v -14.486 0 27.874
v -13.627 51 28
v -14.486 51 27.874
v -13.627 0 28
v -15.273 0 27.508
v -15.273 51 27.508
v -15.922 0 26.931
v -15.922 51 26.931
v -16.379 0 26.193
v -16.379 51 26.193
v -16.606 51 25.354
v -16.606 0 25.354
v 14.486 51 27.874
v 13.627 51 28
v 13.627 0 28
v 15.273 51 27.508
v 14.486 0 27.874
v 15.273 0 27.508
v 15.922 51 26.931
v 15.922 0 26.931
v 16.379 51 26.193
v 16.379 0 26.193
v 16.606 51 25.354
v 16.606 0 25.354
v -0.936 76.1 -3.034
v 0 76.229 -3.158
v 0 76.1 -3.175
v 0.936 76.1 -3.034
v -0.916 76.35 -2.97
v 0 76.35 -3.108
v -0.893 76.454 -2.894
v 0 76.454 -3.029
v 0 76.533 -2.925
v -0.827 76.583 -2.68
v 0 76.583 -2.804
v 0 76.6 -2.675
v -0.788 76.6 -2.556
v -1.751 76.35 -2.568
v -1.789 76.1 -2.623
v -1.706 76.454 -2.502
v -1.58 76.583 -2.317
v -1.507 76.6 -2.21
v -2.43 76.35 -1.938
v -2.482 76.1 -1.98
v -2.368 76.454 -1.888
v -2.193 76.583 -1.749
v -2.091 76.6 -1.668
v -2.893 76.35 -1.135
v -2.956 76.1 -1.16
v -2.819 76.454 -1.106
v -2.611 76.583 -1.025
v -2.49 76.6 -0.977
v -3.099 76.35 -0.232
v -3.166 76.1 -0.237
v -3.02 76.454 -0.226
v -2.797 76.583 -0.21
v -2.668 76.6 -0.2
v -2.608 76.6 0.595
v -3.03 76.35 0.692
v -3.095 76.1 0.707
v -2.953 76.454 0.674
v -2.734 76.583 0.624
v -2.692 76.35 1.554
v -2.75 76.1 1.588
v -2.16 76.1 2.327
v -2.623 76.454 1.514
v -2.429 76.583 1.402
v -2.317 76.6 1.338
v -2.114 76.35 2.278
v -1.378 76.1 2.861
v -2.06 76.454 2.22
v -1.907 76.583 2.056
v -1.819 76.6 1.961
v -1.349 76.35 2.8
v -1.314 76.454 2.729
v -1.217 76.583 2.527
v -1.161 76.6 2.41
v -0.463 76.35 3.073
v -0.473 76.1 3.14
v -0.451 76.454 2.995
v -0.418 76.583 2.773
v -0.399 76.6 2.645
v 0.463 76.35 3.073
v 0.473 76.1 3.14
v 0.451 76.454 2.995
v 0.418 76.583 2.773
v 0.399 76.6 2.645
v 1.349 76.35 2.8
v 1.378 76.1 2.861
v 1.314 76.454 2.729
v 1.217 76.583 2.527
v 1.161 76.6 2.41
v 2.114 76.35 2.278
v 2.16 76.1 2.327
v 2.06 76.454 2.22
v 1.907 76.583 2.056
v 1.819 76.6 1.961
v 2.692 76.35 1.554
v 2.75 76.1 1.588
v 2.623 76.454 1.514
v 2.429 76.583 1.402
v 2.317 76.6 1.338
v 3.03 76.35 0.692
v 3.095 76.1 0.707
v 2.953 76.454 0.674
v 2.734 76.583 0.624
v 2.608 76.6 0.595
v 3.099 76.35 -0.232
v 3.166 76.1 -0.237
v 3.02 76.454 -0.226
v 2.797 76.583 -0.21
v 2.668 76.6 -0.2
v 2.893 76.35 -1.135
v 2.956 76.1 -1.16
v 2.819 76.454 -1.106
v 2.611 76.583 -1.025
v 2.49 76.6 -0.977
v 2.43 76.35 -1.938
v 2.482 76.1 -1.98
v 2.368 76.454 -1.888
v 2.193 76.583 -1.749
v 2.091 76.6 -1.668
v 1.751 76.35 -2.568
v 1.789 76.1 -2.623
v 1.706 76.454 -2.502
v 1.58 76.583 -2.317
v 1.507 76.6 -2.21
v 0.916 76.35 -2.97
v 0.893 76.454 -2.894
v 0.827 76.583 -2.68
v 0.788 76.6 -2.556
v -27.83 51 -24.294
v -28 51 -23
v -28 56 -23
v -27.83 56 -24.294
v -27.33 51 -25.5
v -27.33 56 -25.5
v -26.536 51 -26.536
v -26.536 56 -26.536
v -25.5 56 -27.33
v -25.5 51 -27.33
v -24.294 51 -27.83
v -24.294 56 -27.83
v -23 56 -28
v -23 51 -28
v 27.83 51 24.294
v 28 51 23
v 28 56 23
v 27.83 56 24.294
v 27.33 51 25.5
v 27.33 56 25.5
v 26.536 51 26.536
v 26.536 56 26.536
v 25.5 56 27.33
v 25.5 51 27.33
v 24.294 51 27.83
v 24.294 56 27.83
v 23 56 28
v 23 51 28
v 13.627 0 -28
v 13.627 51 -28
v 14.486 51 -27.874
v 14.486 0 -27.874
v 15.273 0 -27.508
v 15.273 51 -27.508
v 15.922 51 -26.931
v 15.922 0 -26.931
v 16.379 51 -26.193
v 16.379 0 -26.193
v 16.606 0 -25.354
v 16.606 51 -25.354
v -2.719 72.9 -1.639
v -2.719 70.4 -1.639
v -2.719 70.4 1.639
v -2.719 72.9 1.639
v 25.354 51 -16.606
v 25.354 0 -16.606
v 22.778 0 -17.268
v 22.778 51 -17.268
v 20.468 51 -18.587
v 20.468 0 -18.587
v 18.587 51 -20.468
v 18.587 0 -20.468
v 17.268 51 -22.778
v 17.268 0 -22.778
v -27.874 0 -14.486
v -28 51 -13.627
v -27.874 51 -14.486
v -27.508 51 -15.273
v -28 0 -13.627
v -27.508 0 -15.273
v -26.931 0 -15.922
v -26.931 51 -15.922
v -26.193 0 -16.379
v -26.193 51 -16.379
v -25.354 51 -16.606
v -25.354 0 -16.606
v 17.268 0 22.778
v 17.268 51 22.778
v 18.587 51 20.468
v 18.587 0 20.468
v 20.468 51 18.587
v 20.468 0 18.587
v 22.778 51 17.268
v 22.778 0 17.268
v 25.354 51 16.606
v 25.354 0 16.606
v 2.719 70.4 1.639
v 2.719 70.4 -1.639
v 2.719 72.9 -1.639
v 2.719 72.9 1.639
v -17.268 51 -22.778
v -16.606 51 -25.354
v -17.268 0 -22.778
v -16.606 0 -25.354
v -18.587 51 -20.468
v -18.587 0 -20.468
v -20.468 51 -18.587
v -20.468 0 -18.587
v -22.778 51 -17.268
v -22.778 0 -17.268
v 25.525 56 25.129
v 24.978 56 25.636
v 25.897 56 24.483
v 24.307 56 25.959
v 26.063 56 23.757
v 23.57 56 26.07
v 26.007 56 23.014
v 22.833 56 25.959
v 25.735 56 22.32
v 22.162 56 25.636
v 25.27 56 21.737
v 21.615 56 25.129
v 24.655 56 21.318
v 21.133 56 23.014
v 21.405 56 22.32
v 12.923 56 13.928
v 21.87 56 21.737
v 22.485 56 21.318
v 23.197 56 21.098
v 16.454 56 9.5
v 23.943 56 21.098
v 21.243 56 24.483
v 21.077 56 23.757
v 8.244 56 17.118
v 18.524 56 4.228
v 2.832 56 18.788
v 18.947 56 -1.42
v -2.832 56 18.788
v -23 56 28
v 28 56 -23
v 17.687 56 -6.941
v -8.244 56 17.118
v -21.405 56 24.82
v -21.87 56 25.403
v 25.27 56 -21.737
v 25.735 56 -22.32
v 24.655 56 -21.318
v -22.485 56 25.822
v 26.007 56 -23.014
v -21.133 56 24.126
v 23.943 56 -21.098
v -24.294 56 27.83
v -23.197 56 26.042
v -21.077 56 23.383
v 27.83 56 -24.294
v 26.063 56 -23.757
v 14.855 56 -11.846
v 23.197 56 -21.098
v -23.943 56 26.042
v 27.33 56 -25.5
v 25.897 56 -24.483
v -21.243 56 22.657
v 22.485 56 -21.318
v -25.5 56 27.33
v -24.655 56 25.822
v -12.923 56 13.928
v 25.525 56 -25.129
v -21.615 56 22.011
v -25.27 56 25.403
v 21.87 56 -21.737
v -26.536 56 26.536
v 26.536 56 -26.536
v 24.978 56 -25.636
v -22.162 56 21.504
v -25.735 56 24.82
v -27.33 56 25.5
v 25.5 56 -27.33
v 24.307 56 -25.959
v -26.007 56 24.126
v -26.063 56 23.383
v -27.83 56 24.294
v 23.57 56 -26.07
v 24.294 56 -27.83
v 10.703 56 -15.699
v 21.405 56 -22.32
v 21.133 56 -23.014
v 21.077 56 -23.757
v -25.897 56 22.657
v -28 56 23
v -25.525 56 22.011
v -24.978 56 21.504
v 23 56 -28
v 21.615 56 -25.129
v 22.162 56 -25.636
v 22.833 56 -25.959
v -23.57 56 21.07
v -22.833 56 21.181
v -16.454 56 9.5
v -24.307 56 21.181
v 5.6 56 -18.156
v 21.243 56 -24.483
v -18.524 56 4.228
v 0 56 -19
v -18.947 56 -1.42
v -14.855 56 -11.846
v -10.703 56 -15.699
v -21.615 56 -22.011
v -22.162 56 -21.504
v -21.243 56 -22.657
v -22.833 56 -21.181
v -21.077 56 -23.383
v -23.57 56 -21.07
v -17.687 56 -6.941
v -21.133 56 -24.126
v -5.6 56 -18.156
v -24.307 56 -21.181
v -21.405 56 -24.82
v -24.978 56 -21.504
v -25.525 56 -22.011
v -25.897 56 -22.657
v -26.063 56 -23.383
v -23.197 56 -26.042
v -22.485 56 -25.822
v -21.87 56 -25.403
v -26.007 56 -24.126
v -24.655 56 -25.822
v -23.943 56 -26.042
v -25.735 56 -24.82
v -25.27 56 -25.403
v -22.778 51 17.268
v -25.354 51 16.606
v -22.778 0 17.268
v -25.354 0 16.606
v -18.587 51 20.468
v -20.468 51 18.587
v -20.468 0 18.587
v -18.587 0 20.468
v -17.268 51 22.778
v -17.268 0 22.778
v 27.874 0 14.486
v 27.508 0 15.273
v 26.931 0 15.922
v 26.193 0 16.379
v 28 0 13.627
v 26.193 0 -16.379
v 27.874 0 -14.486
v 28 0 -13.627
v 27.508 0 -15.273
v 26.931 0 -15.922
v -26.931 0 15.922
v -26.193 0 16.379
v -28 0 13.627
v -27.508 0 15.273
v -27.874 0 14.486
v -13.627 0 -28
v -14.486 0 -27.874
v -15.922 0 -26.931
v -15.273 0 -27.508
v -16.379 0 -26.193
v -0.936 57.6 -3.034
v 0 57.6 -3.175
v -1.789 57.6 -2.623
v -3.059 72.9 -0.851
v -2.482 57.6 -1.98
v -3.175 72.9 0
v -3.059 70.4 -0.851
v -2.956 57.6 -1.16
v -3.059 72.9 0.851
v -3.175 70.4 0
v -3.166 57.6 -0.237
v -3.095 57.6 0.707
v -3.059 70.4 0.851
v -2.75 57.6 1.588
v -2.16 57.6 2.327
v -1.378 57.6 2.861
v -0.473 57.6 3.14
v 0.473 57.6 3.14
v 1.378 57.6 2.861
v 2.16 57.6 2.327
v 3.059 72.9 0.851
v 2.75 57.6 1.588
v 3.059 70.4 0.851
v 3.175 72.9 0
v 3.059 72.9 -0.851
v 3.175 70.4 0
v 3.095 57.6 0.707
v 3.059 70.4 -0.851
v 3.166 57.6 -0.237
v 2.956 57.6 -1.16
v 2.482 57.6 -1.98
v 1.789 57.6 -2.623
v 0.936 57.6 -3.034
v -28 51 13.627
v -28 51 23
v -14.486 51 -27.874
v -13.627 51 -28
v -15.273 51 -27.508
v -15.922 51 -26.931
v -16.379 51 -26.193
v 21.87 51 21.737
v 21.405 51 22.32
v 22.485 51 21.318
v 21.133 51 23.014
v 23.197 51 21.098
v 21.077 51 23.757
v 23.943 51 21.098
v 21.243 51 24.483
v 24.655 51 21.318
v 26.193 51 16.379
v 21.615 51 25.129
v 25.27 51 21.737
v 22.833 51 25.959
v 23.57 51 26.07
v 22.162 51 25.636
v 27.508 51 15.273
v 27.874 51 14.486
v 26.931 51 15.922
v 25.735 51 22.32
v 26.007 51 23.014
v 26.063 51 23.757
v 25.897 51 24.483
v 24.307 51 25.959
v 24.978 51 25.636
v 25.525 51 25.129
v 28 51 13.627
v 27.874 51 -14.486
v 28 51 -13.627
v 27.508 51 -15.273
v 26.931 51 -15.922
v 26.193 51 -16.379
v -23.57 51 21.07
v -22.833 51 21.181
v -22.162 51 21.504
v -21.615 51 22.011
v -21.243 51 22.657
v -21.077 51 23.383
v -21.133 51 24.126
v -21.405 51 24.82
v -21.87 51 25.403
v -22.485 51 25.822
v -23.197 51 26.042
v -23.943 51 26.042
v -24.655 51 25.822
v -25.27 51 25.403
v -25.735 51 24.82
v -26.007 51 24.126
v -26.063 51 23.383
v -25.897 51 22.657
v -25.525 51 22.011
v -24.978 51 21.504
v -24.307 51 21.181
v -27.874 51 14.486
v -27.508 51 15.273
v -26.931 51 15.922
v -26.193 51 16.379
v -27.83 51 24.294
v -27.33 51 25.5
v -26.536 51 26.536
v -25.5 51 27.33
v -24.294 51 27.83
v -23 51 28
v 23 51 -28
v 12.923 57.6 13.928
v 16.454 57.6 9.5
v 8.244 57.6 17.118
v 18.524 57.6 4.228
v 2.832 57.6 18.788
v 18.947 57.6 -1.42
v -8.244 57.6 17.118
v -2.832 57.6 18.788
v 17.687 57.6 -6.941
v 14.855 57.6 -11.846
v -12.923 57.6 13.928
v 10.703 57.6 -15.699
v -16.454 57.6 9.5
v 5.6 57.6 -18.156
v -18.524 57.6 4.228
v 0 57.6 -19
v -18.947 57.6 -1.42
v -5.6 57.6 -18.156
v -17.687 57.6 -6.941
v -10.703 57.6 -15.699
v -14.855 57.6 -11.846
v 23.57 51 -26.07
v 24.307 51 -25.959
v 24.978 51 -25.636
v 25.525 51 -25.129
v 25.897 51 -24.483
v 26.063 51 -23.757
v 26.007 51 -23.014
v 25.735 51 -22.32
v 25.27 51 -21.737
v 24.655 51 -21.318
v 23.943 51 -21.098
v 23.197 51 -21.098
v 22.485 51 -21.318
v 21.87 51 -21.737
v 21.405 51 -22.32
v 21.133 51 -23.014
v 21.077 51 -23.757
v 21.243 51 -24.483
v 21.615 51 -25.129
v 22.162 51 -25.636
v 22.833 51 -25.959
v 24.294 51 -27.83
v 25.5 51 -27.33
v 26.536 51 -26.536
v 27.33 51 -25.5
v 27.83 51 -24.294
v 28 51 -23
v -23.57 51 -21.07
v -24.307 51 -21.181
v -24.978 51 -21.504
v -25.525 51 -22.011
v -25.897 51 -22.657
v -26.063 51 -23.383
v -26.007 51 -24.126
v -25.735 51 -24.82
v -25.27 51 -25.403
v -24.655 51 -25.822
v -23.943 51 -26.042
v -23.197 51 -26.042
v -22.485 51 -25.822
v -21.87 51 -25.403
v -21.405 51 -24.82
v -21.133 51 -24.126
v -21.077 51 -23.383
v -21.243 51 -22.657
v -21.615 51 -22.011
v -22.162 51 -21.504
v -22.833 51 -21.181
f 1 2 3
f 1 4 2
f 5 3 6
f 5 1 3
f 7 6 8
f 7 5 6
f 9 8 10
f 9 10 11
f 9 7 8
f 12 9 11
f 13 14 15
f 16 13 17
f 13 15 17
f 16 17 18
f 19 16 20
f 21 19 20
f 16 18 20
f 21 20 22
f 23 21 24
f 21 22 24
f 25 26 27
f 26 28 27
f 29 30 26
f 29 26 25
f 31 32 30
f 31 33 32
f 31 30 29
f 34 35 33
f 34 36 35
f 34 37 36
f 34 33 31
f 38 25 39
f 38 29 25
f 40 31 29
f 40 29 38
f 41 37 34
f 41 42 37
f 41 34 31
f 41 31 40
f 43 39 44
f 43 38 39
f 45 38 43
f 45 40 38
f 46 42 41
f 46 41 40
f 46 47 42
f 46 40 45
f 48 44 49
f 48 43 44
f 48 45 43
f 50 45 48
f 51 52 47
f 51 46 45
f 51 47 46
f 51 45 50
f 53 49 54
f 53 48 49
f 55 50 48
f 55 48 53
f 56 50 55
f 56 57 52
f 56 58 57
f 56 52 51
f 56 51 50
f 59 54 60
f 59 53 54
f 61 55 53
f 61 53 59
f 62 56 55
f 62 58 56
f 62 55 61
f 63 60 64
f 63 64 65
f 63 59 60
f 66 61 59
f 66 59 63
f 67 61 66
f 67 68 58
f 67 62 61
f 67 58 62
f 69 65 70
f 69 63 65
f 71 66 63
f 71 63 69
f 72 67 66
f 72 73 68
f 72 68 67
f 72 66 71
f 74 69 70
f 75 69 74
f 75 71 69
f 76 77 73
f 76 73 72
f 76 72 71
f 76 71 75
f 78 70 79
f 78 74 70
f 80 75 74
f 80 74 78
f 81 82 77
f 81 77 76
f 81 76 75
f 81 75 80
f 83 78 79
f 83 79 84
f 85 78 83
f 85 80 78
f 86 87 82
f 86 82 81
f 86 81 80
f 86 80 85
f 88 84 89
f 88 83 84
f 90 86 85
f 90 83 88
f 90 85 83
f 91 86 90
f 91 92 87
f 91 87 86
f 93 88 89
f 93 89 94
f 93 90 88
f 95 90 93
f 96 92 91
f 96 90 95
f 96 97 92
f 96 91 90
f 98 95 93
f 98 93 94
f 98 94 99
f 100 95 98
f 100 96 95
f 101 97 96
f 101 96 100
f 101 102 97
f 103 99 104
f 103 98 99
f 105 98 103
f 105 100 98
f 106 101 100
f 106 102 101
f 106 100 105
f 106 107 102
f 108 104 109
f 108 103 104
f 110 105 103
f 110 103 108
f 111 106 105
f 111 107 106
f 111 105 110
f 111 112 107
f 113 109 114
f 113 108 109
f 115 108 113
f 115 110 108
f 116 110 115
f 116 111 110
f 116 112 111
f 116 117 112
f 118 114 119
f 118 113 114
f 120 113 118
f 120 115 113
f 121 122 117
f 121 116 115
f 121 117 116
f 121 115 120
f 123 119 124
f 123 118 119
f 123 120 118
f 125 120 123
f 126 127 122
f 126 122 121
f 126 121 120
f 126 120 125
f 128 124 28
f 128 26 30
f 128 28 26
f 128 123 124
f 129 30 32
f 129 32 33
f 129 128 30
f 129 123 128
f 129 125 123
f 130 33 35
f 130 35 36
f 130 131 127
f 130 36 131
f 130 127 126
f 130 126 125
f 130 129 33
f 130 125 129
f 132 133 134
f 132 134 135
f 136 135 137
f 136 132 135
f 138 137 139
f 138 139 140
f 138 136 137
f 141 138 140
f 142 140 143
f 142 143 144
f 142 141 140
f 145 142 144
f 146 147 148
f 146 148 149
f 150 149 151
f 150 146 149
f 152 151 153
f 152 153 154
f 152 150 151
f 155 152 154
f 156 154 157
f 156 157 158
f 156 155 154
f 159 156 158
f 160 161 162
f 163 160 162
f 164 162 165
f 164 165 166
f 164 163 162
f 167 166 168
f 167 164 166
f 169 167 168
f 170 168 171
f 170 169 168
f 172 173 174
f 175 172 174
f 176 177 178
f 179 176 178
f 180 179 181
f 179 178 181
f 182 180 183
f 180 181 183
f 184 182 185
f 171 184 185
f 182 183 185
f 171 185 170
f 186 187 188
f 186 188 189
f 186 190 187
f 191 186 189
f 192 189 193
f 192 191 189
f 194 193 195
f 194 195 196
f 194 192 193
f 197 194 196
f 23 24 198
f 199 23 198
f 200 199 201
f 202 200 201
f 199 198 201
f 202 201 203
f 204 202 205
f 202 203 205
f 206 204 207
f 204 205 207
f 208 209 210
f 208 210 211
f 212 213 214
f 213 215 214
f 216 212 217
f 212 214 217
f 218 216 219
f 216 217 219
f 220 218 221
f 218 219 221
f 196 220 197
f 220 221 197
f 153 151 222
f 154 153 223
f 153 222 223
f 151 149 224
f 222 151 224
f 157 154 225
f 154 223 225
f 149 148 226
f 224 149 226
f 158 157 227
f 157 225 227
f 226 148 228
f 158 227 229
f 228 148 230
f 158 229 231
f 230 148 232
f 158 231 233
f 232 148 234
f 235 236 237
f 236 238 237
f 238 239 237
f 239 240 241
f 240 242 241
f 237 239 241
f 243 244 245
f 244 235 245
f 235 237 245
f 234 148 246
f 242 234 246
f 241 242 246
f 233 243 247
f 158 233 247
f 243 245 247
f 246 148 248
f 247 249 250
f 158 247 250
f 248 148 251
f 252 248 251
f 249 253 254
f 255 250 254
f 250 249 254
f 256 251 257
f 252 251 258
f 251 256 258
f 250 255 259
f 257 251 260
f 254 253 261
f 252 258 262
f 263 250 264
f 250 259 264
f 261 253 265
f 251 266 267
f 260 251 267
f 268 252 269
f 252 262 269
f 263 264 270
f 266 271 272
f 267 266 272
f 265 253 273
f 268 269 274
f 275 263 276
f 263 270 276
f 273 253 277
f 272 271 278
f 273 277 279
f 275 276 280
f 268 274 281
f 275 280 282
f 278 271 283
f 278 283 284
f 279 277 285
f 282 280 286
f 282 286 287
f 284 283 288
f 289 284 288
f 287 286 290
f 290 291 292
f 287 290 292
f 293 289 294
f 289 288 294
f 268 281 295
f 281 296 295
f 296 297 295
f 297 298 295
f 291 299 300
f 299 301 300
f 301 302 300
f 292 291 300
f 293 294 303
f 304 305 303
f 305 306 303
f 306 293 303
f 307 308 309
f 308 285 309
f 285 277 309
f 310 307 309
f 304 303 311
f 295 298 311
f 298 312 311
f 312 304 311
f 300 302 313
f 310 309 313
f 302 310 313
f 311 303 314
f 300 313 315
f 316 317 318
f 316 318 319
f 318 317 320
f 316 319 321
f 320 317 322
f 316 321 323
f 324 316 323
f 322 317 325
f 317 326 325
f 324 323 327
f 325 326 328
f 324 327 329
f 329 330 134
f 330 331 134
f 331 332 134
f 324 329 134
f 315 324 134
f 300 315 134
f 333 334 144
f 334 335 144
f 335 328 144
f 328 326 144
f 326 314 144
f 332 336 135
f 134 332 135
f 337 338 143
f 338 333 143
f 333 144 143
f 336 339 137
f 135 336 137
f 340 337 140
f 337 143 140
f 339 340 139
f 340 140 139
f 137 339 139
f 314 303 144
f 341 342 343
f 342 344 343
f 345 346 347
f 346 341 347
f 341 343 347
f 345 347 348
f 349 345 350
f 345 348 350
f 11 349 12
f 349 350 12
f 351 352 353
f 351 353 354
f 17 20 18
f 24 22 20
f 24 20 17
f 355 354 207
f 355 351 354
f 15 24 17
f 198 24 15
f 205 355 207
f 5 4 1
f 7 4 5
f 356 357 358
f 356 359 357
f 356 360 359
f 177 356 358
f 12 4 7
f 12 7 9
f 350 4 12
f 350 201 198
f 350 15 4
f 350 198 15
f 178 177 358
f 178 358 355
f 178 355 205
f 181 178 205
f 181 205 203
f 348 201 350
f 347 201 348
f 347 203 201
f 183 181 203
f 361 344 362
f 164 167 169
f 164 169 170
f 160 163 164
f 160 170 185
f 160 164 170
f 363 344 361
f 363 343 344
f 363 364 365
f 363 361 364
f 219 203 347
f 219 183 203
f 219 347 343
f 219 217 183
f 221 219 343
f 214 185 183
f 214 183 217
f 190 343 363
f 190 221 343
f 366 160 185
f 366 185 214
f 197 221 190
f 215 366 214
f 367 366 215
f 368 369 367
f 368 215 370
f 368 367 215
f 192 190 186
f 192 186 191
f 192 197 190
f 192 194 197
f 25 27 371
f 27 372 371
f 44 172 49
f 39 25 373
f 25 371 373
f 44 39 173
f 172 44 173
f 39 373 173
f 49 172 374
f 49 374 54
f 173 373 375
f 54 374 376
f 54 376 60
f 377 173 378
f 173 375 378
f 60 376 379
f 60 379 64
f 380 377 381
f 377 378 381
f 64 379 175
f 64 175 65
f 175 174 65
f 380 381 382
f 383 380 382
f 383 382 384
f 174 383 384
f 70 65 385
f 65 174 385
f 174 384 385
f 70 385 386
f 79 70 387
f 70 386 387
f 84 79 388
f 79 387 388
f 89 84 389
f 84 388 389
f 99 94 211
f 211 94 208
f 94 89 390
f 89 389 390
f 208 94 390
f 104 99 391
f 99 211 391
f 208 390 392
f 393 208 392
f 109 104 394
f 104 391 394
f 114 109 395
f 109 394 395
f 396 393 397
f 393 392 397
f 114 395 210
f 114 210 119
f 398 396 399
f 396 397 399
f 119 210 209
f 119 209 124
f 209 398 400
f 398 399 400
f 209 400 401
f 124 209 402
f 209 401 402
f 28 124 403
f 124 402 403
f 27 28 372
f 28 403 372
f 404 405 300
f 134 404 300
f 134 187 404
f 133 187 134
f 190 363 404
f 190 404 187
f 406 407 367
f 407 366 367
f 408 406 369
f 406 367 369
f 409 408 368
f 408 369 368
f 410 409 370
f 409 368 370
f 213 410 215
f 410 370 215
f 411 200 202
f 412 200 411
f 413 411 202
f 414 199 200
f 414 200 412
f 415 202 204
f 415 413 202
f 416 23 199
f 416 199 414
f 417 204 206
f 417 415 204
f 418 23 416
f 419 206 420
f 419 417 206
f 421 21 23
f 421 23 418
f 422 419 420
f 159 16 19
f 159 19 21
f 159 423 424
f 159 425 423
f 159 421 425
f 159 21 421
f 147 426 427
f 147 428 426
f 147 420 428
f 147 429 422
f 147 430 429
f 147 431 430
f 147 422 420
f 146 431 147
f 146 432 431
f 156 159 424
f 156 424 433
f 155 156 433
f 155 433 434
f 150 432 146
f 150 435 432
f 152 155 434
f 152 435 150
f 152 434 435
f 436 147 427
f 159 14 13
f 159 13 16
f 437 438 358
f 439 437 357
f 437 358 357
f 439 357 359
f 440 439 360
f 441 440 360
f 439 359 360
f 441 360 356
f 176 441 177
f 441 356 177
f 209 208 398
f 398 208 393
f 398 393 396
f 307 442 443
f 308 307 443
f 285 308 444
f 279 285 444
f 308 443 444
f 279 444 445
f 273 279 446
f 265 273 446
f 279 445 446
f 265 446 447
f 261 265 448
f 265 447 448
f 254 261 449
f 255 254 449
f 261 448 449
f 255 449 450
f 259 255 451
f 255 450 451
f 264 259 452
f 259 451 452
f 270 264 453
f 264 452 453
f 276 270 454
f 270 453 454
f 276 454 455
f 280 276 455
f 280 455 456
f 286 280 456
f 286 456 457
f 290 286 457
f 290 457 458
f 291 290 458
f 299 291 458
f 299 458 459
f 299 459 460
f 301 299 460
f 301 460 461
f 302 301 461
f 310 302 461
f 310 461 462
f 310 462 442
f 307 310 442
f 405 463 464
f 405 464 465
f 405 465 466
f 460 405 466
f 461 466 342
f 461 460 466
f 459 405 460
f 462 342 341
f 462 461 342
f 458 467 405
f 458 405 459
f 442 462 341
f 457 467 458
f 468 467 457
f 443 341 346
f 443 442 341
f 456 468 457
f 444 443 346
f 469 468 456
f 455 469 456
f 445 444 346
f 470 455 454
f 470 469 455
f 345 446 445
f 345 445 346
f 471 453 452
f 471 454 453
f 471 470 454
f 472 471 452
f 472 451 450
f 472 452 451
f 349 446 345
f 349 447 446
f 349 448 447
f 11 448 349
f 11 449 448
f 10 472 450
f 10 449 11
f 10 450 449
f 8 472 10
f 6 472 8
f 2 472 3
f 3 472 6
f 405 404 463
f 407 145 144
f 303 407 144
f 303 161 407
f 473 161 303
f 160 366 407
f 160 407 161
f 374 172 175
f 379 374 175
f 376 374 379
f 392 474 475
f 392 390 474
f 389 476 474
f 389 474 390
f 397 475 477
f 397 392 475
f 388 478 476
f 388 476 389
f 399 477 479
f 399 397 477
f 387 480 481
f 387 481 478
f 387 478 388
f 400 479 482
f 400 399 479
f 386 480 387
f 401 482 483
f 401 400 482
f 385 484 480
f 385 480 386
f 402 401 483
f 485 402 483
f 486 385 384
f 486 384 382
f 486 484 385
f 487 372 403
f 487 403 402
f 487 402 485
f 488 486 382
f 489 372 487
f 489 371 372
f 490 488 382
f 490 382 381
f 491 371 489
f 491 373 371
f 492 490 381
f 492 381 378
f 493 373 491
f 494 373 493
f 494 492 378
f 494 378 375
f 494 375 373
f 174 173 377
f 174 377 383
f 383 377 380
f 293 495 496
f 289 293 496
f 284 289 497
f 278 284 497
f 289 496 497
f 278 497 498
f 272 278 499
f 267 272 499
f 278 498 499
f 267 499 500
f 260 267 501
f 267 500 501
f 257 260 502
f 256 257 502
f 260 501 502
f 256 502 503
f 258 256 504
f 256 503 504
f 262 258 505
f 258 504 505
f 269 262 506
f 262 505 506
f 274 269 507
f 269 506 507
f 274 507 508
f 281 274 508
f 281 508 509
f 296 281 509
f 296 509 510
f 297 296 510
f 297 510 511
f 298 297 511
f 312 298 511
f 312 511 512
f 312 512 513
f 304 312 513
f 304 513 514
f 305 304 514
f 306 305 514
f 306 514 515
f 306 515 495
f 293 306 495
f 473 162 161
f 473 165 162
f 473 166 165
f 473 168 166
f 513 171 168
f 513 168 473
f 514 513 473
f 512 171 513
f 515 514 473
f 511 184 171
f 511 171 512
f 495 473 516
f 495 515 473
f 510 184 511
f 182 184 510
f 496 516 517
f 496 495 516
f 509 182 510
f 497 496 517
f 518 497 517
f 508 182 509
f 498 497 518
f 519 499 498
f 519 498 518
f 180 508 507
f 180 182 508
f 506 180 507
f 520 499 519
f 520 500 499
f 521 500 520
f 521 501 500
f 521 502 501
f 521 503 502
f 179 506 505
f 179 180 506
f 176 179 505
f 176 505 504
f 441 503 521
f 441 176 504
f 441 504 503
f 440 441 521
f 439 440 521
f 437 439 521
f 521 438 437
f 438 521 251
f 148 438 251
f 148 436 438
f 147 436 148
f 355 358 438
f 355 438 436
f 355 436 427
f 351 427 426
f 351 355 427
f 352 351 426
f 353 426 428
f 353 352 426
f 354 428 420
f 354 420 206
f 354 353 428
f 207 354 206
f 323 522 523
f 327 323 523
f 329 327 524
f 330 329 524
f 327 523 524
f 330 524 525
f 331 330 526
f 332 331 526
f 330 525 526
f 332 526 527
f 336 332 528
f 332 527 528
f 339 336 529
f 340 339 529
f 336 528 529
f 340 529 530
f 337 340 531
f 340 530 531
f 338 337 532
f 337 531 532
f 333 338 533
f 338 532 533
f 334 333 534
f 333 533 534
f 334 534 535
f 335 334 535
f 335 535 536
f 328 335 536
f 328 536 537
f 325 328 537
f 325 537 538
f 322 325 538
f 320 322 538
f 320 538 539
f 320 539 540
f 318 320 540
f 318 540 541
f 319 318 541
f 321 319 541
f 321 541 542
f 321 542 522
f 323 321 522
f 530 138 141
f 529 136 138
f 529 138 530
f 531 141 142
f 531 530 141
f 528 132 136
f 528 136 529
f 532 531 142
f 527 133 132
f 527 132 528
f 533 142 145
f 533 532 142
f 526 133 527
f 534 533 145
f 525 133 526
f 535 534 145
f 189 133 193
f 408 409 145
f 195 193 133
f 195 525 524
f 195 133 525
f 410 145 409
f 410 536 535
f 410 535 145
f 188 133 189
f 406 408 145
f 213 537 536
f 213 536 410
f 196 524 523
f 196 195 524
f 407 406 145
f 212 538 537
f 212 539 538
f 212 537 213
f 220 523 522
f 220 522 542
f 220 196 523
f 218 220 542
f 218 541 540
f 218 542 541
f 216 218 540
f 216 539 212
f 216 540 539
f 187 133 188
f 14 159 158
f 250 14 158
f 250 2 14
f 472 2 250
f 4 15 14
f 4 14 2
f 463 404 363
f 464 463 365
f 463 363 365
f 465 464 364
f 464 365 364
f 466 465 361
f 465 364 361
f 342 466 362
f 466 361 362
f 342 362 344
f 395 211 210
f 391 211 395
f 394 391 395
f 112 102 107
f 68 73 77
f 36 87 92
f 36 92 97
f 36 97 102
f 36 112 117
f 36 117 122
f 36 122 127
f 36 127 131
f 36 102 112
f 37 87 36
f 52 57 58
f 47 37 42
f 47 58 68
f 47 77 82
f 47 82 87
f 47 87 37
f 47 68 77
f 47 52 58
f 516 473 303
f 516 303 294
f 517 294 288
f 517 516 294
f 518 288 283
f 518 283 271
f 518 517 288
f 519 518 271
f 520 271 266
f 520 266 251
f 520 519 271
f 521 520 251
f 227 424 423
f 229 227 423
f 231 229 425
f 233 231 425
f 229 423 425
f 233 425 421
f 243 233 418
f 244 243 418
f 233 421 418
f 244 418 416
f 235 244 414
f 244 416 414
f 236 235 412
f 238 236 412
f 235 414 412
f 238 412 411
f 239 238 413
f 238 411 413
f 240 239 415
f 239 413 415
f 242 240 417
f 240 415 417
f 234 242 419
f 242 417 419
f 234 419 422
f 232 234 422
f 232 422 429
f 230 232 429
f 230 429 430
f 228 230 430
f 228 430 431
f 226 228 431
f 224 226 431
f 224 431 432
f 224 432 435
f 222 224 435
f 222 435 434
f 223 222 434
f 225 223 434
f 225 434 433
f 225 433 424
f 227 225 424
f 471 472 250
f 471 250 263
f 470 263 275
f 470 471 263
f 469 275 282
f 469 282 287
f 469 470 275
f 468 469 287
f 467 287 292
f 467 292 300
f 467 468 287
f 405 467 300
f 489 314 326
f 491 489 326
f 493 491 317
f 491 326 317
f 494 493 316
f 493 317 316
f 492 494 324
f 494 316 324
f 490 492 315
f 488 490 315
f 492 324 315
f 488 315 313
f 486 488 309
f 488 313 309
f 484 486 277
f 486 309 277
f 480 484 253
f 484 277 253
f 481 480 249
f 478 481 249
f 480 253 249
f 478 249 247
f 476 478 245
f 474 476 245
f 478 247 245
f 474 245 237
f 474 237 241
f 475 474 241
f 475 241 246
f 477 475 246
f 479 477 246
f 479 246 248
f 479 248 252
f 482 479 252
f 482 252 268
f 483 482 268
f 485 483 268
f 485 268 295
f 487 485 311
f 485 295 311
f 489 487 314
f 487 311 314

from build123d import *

# Parameters (mm, degrees)
EXTRUDE1_DEPTH      = 56
SKETCH2_R           = 2.5
EXTRUDE2_DEPTH      = 69.585712798
SKETCH4_R           = 10
EXTRUDE3_DEPTH      = 51
FILLET1_R           = 3
SKETCH5_R           = 19
EXTRUDE4_DEPTH      = 1.6
SKETCH6_R           = 3.175
EXTRUDE5_DEPTH      = 20.6
FILLET2_R           = 0.5
SKETCH_1_W          = 0.754278007
SKETCH_1_H          = 3.431599036
CUT_EXTRUDE_1_DEPTH = 2.5


with BuildPart() as part:
    # Sketch1 → Extrude1 (new body)
    with BuildSketch(Plane(origin=(0, 0, 0), x_dir=(1, 0, 0), z_dir=(0, 1, 0))):
        with BuildLine():
            Line((-23, 28), (23, 28))
            ThreePointArc((23, 28), (26.535533906, 26.535533906), (28, 23))
            Line((28, 23), (28, -23))
            ThreePointArc((28, -23), (26.535533906, -26.535533906), (23, -28))
            Line((23, -28), (-23, -28))
            ThreePointArc((-23, -28), (-26.535533906, -26.535533906), (-28, -23))
            Line((-28, -23), (-28, 23))
            ThreePointArc((-28, 23), (-26.535533906, 26.535533906), (-23, 28))
        make_face()
    extrude(amount=EXTRUDE1_DEPTH)

    # Sketch2 → Extrude2 (cut, through all)
    with BuildSketch(Plane.XZ):
        with Locations(Location((23.57, 23.57, 0), (0, 0, 90))):
            Circle(SKETCH2_R)
        with Locations(Location((23.57, -23.57, 0), (0, 0, 270))):
            Circle(SKETCH2_R)
        with Locations(Location((-23.57, -23.57, 0), (0, 0, 90))):
            Circle(SKETCH2_R)
        with Locations(Location((-23.57, 23.57, 0), (0, 0, 270))):
            Circle(SKETCH2_R)
    extrude(amount=-EXTRUDE2_DEPTH, mode=Mode.SUBTRACT)

    # Sketch4 → Extrude3 (cut)
    with BuildSketch(Plane.XZ):
        with Locations((-26.535533906, 26.535533906)):
            Circle(SKETCH4_R)
        with Locations((26.535533906, 26.535533906)):
            Circle(SKETCH4_R)
        with Locations((26.535533906, -26.535533906)):
            Circle(SKETCH4_R)
        with Locations((-26.535533906, -26.535533906)):
            Circle(SKETCH4_R)
    extrude(amount=-EXTRUDE3_DEPTH, mode=Mode.SUBTRACT)

    # Fillet1
    fillet1_edges = [part.edges().sort_by_distance(p)[0] for p in [
        (-28, 25.5, 16.643348149),
        (-16.643348149, 25.5, 28),
        (16.643348149, 25.5, 28),
        (28, 25.5, 16.643348149),
        (28, 25.5, -16.643348149),
        (16.643348149, 25.5, -28),
        (-28, 25.5, -16.643348149),
        (-16.643348149, 25.5, -28),
    ]]
    fillet(fillet1_edges, radius=FILLET1_R)

    # Sketch5 → Extrude4 (add)
    with BuildSketch(Plane(origin=(0, 56, 0), x_dir=(1, 0, 0), z_dir=(0, 1, 0))):
        with Locations(Location((0, 0, 0), (0, 0, 90))):
            Circle(SKETCH5_R)
    extrude(amount=EXTRUDE4_DEPTH)

    # Sketch6 → Extrude5 (add)
    with BuildSketch(Plane(origin=(0, 56, 0), x_dir=(1, 0, 0), z_dir=(0, 1, 0))):
        with Locations(Location((0, 0, 0), (0, 0, 90))):
            Circle(SKETCH6_R)
    extrude(amount=EXTRUDE5_DEPTH)

    # Fillet2
    fillet2_edges = [part.edges().sort_by_distance(p)[0] for p in [
        (0, 76.6, 3.175),
    ]]
    fillet(fillet2_edges, radius=FILLET2_R)

    # Эскиз1 → Вытянуть1 (cut)
    with BuildSketch(Plane(origin=(0, 70.4, 0), x_dir=(-1, 0, 0), z_dir=(0, 1, 0))):
        with Locations((3.096320075, 0.076690216)):
            Rectangle(SKETCH_1_W, SKETCH_1_H)
        with Locations((-3.096320075, 0.076690216)):
            Rectangle(SKETCH_1_W, SKETCH_1_H)
    extrude(amount=CUT_EXTRUDE_1_DEPTH, mode=Mode.SUBTRACT)


solid = part.part
